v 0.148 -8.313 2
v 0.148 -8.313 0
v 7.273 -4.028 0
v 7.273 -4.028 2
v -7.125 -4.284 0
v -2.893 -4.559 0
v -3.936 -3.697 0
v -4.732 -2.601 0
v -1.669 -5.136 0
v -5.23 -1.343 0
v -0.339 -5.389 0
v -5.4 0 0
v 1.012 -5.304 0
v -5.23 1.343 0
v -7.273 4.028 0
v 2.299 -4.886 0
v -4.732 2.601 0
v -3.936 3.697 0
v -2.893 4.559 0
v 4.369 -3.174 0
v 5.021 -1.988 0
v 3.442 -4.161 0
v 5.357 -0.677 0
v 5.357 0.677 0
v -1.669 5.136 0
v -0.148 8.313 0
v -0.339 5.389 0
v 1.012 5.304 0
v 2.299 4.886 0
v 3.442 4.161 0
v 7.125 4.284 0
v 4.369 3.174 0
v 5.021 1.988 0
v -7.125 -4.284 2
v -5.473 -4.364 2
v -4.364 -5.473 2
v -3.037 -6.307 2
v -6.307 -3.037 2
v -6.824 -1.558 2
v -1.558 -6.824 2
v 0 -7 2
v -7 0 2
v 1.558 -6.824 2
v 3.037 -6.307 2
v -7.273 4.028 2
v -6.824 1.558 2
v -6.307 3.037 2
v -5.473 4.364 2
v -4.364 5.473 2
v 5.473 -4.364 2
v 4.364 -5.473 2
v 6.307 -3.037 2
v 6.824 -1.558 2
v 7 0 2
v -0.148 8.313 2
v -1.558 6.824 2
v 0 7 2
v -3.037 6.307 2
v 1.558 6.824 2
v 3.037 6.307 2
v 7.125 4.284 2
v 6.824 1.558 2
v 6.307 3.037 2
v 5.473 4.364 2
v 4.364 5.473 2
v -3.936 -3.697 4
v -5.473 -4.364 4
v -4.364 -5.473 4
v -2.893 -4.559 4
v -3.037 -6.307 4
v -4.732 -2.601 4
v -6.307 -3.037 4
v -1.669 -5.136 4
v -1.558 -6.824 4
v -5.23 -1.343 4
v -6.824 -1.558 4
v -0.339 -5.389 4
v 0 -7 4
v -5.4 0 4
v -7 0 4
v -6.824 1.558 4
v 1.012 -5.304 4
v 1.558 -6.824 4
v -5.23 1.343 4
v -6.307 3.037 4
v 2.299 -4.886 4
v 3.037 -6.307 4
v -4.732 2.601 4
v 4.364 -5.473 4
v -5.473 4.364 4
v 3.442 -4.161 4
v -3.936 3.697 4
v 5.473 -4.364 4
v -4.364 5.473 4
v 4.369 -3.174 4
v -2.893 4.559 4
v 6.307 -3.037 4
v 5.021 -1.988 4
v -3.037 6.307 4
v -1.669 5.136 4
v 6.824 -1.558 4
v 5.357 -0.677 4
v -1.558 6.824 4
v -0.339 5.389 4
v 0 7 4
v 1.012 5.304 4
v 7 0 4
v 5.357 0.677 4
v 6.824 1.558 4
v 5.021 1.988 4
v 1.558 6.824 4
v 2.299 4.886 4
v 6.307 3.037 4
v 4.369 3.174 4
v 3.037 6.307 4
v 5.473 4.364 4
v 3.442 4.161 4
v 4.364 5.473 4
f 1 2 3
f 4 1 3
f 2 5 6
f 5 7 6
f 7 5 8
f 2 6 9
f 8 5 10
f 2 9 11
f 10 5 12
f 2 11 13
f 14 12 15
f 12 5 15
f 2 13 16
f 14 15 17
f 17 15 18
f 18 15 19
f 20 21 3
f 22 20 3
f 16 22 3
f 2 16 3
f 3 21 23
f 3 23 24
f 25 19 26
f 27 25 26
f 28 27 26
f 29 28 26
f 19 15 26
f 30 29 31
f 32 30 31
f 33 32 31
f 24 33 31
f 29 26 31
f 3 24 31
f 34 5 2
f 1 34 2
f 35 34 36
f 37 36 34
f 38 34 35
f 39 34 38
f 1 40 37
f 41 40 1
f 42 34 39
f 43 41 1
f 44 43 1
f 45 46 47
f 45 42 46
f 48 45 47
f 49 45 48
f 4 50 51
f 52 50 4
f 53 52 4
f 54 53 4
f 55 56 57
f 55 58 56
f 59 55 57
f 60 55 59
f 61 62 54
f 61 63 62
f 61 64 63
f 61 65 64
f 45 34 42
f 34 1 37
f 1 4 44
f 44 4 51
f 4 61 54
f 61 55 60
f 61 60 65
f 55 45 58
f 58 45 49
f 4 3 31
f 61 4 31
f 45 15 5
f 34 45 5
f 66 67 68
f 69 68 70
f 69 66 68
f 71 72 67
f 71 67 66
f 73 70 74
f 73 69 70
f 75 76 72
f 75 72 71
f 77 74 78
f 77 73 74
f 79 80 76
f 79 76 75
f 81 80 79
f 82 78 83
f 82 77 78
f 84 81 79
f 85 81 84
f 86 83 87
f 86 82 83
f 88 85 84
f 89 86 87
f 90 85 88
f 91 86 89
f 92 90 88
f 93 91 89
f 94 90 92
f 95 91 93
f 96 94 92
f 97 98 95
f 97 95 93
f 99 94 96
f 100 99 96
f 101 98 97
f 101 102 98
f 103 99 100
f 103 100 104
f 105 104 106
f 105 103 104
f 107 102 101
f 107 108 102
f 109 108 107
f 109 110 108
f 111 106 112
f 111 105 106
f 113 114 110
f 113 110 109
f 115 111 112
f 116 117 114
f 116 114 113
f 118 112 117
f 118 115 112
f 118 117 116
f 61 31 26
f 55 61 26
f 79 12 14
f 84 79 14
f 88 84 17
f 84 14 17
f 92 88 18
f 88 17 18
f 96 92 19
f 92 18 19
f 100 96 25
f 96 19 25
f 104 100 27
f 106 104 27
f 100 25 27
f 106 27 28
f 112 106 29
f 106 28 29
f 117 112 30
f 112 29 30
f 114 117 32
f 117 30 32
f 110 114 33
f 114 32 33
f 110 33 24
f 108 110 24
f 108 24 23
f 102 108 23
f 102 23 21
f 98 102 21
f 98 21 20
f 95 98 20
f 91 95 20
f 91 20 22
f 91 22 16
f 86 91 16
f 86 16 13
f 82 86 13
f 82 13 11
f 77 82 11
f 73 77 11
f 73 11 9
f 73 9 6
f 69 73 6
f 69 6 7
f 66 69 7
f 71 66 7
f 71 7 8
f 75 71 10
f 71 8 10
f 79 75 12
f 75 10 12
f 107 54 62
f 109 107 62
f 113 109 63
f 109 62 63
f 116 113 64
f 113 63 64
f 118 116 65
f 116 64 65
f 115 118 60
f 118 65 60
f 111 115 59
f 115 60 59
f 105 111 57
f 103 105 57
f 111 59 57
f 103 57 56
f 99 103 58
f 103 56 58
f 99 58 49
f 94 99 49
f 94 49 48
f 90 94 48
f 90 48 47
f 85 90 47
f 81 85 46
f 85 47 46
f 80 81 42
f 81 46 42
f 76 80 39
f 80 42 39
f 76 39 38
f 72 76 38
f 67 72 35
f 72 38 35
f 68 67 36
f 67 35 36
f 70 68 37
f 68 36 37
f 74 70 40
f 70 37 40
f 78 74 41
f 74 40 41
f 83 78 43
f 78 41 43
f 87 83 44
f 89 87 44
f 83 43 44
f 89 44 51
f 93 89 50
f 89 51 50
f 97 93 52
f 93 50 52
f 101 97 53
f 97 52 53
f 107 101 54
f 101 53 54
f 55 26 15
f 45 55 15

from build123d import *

# Parameters (mm, degrees)
BOSS_EXTRUDE1_DEPTH         = 2
SKETCH4_R                   = 7
BOSS_EXTRUDE2_DEPTH         = 2
M12X1_25_TAPPED_HOLE2_D     = 10.8
M12X1_25_TAPPED_HOLE2_DEPTH = 8.75
M12X1_25_TAPPED_HOLE2_TIP   = 3.244647343


with BuildPart() as part:
    # Sketch1 → Boss-Extrude1 (new body)
    with BuildSketch(Plane.XY):
        Polygon((-7.272664144, 4.028443403), (-7.125066396, -4.284090201), (0.147597748, -8.312533603), (7.272664144, -4.028443403), (7.125066396, 4.284090201), (-0.147597748, 8.312533603), align=None)
    extrude(amount=BOSS_EXTRUDE1_DEPTH)

    # Sketch4 → Boss-Extrude2 (add)
    with BuildSketch(Plane.XY.offset(2)):
        Circle(SKETCH4_R)
    extrude(amount=BOSS_EXTRUDE2_DEPTH)

    # M12x1.25 Tapped Hole2
    with Locations(Plane.XY.offset(4)):
        with Locations((0, 0)):
            Hole(M12X1_25_TAPPED_HOLE2_D / 2, depth=M12X1_25_TAPPED_HOLE2_DEPTH)
            with Locations((0, 0, -(M12X1_25_TAPPED_HOLE2_DEPTH + M12X1_25_TAPPED_HOLE2_TIP / 2))):  # 118° drill point
                Cone(0, M12X1_25_TAPPED_HOLE2_D / 2, M12X1_25_TAPPED_HOLE2_TIP, mode=Mode.SUBTRACT)


solid = part.part
